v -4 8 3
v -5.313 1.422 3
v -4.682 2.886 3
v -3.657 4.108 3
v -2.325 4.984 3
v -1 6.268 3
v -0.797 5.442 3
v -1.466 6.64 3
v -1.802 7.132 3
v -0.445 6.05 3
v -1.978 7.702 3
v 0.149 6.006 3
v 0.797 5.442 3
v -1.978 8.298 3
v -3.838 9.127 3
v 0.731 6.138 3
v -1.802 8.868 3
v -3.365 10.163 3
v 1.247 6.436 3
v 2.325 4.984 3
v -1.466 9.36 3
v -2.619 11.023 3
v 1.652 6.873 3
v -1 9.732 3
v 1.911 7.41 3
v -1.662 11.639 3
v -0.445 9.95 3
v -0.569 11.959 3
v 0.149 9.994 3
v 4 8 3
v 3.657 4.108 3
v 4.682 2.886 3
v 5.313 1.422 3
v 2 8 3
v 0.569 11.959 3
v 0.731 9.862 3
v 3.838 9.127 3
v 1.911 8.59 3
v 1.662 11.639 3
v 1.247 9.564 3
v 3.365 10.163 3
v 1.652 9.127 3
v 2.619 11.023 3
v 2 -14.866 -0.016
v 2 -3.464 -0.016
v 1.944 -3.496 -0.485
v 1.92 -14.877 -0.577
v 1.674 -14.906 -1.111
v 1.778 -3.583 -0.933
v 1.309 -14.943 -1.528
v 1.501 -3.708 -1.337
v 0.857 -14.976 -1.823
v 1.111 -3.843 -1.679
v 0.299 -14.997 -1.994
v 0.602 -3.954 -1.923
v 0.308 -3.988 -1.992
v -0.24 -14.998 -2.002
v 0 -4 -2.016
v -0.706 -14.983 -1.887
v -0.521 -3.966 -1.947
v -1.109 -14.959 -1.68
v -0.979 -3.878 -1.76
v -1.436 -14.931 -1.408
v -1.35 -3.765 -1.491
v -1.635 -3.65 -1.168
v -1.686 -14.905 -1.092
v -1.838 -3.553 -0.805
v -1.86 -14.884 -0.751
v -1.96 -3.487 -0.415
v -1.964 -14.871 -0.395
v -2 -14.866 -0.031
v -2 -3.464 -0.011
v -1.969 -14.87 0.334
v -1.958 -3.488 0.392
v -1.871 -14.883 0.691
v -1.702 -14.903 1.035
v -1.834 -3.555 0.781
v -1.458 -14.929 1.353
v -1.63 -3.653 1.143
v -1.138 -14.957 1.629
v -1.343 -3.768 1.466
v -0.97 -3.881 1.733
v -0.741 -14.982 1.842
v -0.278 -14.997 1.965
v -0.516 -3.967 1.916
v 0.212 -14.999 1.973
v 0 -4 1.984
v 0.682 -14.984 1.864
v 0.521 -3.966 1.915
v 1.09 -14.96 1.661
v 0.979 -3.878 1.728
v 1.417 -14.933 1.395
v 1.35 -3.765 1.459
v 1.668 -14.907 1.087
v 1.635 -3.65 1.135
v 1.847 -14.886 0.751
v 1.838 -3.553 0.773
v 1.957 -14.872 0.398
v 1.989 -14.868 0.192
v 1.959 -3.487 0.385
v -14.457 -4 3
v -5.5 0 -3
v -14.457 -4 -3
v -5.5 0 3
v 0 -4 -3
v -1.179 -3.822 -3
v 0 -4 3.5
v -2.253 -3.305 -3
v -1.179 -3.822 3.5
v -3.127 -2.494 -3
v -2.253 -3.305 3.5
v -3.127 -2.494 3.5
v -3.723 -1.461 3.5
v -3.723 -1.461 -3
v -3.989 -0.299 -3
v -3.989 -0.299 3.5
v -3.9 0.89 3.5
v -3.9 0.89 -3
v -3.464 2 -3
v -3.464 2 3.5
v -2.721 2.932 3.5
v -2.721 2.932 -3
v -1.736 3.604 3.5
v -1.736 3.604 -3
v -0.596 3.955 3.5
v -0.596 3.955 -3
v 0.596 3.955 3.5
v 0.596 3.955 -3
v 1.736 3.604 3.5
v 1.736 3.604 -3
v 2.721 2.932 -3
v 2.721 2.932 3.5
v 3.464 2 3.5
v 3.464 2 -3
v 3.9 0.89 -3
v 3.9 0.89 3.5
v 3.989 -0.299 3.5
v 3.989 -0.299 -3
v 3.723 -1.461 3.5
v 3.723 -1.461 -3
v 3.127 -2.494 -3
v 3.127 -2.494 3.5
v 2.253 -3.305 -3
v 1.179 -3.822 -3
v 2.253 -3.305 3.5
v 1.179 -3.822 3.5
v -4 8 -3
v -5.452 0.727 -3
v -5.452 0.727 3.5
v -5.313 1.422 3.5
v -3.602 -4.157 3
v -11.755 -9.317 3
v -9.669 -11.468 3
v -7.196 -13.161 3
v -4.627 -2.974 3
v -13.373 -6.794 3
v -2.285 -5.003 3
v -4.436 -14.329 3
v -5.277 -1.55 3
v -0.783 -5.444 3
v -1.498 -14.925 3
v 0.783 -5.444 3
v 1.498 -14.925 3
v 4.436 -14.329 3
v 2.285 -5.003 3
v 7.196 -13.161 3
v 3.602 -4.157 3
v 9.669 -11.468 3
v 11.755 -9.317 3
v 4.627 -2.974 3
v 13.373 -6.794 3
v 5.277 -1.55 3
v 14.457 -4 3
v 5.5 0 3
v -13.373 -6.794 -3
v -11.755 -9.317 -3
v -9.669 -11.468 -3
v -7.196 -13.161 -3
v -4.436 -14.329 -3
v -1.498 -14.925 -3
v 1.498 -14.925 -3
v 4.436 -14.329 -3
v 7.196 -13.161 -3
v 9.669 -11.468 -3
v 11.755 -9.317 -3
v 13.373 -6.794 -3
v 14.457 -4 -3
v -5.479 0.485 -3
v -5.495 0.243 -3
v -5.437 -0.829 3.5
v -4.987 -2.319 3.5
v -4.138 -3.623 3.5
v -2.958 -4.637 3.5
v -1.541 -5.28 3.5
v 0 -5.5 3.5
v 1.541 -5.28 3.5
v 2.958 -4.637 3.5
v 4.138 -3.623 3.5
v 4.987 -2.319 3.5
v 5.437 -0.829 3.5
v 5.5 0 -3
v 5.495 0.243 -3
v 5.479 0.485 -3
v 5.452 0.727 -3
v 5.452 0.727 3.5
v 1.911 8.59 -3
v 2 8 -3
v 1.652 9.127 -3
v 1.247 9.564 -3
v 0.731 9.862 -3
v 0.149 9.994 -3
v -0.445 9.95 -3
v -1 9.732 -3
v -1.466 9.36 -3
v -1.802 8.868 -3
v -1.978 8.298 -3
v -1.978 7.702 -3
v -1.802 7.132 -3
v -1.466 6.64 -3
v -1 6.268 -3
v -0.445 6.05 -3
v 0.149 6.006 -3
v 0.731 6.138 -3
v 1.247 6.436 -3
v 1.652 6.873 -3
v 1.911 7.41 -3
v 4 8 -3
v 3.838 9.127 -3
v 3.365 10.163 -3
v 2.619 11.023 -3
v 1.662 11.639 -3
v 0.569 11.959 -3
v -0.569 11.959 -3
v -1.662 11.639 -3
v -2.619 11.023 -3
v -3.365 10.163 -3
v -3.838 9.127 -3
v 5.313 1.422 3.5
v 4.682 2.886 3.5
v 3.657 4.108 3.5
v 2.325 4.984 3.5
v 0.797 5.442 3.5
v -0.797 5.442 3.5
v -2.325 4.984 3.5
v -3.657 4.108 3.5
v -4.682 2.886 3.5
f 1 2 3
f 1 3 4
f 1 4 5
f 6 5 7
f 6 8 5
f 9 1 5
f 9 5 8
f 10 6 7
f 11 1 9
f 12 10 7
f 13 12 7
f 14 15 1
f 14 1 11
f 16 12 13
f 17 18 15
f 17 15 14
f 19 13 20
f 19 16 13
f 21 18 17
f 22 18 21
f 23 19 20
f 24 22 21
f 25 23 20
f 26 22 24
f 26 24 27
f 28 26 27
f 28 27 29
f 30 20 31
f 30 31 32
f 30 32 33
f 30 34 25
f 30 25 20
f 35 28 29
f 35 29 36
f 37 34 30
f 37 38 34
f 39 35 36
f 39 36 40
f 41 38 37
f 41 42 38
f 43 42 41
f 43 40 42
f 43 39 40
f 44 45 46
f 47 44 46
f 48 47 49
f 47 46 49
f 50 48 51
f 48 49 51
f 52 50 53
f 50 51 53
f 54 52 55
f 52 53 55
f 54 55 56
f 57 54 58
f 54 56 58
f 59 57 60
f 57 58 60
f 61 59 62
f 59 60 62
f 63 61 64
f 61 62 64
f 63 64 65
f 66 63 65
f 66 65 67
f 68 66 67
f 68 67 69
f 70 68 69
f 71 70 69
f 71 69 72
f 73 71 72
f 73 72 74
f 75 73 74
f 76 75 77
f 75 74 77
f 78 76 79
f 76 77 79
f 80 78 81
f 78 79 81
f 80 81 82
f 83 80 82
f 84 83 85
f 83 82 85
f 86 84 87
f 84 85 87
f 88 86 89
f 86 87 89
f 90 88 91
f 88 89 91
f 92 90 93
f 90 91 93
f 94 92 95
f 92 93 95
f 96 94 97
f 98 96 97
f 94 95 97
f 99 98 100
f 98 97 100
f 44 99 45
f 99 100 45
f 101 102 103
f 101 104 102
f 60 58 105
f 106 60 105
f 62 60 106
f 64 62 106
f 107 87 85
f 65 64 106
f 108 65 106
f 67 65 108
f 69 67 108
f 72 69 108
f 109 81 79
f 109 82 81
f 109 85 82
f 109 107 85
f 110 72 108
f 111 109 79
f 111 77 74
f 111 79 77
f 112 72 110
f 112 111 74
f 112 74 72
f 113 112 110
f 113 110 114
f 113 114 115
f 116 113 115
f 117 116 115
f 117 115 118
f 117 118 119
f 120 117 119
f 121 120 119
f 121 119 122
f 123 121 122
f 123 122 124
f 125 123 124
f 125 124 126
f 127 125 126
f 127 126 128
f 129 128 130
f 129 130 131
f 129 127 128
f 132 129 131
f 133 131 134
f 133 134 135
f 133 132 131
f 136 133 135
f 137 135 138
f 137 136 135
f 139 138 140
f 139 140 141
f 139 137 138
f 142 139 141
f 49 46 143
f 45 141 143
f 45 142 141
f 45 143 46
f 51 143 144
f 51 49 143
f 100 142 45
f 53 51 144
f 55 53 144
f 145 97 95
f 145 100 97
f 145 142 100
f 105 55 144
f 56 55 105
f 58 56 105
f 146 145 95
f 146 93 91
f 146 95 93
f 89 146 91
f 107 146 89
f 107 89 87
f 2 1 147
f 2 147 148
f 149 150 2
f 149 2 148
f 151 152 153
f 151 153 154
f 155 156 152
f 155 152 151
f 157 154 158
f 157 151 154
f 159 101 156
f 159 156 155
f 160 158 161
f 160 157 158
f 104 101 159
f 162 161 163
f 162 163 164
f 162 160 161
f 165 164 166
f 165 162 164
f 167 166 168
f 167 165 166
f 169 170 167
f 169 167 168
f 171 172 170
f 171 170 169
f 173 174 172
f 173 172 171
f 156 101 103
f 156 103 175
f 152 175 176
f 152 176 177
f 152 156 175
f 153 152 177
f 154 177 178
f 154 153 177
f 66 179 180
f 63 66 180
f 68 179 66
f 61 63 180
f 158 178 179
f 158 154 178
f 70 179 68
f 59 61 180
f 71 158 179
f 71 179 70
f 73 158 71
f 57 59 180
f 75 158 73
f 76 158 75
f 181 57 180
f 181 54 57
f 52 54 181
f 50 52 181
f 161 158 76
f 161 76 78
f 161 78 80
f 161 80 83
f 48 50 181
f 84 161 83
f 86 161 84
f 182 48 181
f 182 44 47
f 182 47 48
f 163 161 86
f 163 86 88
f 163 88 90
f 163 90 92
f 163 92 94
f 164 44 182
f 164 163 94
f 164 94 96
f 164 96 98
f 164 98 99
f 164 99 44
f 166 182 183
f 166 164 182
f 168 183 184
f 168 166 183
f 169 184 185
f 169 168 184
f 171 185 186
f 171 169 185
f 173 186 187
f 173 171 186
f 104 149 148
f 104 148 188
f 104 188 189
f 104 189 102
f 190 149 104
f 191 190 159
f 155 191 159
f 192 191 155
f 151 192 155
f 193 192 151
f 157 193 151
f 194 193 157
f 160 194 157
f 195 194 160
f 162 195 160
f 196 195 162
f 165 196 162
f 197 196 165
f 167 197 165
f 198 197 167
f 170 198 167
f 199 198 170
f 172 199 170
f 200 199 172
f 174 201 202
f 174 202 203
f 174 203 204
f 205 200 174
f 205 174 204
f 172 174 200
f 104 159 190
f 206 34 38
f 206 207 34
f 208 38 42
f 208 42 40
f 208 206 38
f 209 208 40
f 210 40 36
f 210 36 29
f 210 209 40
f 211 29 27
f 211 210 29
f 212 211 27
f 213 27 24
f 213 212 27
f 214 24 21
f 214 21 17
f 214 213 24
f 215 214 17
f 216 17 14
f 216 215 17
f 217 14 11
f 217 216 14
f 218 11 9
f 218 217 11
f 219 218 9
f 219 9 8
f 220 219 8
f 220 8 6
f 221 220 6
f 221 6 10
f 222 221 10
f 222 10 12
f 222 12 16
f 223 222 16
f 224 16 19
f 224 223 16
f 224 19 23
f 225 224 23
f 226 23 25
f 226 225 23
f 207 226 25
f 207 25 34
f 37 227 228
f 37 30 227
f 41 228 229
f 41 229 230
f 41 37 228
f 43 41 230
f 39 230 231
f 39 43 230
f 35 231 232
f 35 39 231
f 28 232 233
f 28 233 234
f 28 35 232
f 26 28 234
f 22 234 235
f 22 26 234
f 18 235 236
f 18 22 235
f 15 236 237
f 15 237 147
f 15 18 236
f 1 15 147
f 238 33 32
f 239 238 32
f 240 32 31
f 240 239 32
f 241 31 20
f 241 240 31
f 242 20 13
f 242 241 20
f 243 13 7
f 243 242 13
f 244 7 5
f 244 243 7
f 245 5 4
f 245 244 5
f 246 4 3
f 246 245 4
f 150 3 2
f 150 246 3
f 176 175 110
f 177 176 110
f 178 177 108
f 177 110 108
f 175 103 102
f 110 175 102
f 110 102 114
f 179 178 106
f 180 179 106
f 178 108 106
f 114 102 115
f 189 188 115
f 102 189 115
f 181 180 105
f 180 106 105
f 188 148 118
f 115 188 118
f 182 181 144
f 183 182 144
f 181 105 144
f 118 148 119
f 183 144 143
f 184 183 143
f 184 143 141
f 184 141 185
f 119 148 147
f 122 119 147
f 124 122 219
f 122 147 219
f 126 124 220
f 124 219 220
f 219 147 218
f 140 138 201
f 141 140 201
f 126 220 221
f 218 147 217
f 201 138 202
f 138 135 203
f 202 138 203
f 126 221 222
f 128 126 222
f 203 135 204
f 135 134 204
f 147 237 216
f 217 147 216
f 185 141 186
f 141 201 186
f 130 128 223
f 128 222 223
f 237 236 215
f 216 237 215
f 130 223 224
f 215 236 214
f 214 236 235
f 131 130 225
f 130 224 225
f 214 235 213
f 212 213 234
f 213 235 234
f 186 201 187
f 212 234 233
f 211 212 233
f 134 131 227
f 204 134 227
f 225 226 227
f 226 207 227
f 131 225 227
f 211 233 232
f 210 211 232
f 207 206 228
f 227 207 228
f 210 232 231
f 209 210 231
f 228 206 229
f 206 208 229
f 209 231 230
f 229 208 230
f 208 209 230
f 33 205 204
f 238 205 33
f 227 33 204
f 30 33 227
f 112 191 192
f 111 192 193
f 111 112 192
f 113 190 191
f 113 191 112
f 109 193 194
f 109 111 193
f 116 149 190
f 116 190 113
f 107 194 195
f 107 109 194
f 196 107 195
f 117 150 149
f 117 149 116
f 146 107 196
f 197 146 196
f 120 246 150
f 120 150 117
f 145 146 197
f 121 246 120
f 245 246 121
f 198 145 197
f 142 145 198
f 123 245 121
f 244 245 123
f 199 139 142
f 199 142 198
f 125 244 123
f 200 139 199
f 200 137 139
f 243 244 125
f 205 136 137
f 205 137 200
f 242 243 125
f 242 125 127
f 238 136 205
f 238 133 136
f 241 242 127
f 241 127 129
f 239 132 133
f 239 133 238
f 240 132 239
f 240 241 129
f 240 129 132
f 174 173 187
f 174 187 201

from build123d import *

# Parameters (mm, degrees)
BOSS_EXTRUDE1_DEPTH          = 3
SKETCH1_R                    = 2
BOSS_EXTRUDE1_2_DEPTH        = 3
BOSS_EXTRUDE4_START          = 3.5
BOSS_EXTRUDE4_DEPTH          = 6.5
F_4_0_4_DIAMETER_HOLE1_D     = 4
F_4_0_4_DIAMETER_HOLE1_DEPTH = 15


with BuildPart() as part:
    # Sketch1 → Boss-Extrude1 (new, symmetric)
    with BuildSketch(Plane.XY):
        with BuildLine():
            Line((-5.5, 0), (-14.456832294800959, -4))
            ThreePointArc((-14.45683229480096, -4.000000000000001), (1.78e-15, -15), (14.456832294800964, -4))
            Line((14.456832294800959, -4), (5.5, 0))
            ThreePointArc((5.5, -1.35e-15), (3.8890872965259793, -3.8890872965260432), (-8.406e-14, -5.5))
            ThreePointArc((-8.406e-14, -5.5), (-3.8890872965260415, -3.8890872965259815), (-5.5, 6.7e-16))
        make_face()
    extrude(amount=BOSS_EXTRUDE1_DEPTH, both=True)



with BuildPart() as body_2:
    # Sketch1 → Boss-Extrude1 2 (new, symmetric)
    with BuildSketch(Plane.XY):
        with BuildLine():
            Line((-4, 8), (-5.313044131475103, 1.4218164638932054))
            ThreePointArc((-5.313044131475121, 1.4218164638932076), (-6.7e-16, 5.5), (5.313044131475121, 1.421816463893209))
            Line((5.313044131475103, 1.4218164638932063), (4, 8))
            ThreePointArc((4, 8), (2e-17, 12), (-4, 8))
        make_face()
        with Locations((8.9e-16, 8)):
            Circle(SKETCH1_R, mode=Mode.SUBTRACT)
    extrude(amount=BOSS_EXTRUDE1_2_DEPTH, both=True)


with BuildPart() as part_1:
    add(part.part)

    add(body_2.part)  # Boss-Extrude4 merges body 2
    # Sketch1<5> → Boss-Extrude4 (add)
    with BuildSketch(Plane.XY.offset(BOSS_EXTRUDE4_START)):
        with BuildLine():
            Line((0, -4), (0, -5.5))
            ThreePointArc((-8.406e-14, -5.5), (3.8890872965259793, -3.8890872965260432), (5.5, -1.35e-15))
            ThreePointArc((5.5, 0), (5.487925108620274, 0.3642499171930612), (5.45175345375449, 0.7269004605006023))
            Line((5.45175345375449, 0.7269004605006018), (5.313044131475103, 1.4218164638932063))
            ThreePointArc((5.31304413147512, 1.421816463893209), (3.348881115282156, 4.362911330259479), (-8.271e-14, 5.5))
            Line((0, 5.500000000000002), (0, 4))
            ThreePointArc((-1.2321e-13, 4), (2.8284271247461463, 2.828427124746234), (4, 0))
            ThreePointArc((4, -9.8e-16), (2.8284271247461468, -2.8284271247462334), (-1.2508e-13, -4))
        make_face()
        with BuildLine():
            ThreePointArc((-5.45175345375449, 0.7269004605006025), (-5.487925108620274, 0.36424991719306166), (-5.5, 6.7e-16))
            ThreePointArc((-5.5, 6.7e-16), (-3.8890872965260415, -3.8890872965259815), (-8.406e-14, -5.5))
            Line((0, -5.5), (0, -4))
            ThreePointArc((-1.2508e-13, -4), (-4, 4.9e-16), (-1.2321e-13, 4))
            Line((0, 4), (0, 5.500000000000002))
            ThreePointArc((-8.271e-14, 5.5), (-3.3488811152822207, 4.36291133025943), (-5.31304413147512, 1.4218164638932085))
            Line((-5.313044131475103, 1.4218164638932054), (-5.45175345375449, 0.7269004605006018))
        make_face()
    extrude(amount=-BOSS_EXTRUDE4_DEPTH)

    # Ø4.0 (4) Diameter Hole1
    with Locations(Plane(origin=(0, -15, -0.016063309), x_dir=(-1, 0, 0), z_dir=(0, -1, 0))):
        with Locations((0, 0)):
            Hole(F_4_0_4_DIAMETER_HOLE1_D / 2, depth=F_4_0_4_DIAMETER_HOLE1_DEPTH)


solid = part_1.part
